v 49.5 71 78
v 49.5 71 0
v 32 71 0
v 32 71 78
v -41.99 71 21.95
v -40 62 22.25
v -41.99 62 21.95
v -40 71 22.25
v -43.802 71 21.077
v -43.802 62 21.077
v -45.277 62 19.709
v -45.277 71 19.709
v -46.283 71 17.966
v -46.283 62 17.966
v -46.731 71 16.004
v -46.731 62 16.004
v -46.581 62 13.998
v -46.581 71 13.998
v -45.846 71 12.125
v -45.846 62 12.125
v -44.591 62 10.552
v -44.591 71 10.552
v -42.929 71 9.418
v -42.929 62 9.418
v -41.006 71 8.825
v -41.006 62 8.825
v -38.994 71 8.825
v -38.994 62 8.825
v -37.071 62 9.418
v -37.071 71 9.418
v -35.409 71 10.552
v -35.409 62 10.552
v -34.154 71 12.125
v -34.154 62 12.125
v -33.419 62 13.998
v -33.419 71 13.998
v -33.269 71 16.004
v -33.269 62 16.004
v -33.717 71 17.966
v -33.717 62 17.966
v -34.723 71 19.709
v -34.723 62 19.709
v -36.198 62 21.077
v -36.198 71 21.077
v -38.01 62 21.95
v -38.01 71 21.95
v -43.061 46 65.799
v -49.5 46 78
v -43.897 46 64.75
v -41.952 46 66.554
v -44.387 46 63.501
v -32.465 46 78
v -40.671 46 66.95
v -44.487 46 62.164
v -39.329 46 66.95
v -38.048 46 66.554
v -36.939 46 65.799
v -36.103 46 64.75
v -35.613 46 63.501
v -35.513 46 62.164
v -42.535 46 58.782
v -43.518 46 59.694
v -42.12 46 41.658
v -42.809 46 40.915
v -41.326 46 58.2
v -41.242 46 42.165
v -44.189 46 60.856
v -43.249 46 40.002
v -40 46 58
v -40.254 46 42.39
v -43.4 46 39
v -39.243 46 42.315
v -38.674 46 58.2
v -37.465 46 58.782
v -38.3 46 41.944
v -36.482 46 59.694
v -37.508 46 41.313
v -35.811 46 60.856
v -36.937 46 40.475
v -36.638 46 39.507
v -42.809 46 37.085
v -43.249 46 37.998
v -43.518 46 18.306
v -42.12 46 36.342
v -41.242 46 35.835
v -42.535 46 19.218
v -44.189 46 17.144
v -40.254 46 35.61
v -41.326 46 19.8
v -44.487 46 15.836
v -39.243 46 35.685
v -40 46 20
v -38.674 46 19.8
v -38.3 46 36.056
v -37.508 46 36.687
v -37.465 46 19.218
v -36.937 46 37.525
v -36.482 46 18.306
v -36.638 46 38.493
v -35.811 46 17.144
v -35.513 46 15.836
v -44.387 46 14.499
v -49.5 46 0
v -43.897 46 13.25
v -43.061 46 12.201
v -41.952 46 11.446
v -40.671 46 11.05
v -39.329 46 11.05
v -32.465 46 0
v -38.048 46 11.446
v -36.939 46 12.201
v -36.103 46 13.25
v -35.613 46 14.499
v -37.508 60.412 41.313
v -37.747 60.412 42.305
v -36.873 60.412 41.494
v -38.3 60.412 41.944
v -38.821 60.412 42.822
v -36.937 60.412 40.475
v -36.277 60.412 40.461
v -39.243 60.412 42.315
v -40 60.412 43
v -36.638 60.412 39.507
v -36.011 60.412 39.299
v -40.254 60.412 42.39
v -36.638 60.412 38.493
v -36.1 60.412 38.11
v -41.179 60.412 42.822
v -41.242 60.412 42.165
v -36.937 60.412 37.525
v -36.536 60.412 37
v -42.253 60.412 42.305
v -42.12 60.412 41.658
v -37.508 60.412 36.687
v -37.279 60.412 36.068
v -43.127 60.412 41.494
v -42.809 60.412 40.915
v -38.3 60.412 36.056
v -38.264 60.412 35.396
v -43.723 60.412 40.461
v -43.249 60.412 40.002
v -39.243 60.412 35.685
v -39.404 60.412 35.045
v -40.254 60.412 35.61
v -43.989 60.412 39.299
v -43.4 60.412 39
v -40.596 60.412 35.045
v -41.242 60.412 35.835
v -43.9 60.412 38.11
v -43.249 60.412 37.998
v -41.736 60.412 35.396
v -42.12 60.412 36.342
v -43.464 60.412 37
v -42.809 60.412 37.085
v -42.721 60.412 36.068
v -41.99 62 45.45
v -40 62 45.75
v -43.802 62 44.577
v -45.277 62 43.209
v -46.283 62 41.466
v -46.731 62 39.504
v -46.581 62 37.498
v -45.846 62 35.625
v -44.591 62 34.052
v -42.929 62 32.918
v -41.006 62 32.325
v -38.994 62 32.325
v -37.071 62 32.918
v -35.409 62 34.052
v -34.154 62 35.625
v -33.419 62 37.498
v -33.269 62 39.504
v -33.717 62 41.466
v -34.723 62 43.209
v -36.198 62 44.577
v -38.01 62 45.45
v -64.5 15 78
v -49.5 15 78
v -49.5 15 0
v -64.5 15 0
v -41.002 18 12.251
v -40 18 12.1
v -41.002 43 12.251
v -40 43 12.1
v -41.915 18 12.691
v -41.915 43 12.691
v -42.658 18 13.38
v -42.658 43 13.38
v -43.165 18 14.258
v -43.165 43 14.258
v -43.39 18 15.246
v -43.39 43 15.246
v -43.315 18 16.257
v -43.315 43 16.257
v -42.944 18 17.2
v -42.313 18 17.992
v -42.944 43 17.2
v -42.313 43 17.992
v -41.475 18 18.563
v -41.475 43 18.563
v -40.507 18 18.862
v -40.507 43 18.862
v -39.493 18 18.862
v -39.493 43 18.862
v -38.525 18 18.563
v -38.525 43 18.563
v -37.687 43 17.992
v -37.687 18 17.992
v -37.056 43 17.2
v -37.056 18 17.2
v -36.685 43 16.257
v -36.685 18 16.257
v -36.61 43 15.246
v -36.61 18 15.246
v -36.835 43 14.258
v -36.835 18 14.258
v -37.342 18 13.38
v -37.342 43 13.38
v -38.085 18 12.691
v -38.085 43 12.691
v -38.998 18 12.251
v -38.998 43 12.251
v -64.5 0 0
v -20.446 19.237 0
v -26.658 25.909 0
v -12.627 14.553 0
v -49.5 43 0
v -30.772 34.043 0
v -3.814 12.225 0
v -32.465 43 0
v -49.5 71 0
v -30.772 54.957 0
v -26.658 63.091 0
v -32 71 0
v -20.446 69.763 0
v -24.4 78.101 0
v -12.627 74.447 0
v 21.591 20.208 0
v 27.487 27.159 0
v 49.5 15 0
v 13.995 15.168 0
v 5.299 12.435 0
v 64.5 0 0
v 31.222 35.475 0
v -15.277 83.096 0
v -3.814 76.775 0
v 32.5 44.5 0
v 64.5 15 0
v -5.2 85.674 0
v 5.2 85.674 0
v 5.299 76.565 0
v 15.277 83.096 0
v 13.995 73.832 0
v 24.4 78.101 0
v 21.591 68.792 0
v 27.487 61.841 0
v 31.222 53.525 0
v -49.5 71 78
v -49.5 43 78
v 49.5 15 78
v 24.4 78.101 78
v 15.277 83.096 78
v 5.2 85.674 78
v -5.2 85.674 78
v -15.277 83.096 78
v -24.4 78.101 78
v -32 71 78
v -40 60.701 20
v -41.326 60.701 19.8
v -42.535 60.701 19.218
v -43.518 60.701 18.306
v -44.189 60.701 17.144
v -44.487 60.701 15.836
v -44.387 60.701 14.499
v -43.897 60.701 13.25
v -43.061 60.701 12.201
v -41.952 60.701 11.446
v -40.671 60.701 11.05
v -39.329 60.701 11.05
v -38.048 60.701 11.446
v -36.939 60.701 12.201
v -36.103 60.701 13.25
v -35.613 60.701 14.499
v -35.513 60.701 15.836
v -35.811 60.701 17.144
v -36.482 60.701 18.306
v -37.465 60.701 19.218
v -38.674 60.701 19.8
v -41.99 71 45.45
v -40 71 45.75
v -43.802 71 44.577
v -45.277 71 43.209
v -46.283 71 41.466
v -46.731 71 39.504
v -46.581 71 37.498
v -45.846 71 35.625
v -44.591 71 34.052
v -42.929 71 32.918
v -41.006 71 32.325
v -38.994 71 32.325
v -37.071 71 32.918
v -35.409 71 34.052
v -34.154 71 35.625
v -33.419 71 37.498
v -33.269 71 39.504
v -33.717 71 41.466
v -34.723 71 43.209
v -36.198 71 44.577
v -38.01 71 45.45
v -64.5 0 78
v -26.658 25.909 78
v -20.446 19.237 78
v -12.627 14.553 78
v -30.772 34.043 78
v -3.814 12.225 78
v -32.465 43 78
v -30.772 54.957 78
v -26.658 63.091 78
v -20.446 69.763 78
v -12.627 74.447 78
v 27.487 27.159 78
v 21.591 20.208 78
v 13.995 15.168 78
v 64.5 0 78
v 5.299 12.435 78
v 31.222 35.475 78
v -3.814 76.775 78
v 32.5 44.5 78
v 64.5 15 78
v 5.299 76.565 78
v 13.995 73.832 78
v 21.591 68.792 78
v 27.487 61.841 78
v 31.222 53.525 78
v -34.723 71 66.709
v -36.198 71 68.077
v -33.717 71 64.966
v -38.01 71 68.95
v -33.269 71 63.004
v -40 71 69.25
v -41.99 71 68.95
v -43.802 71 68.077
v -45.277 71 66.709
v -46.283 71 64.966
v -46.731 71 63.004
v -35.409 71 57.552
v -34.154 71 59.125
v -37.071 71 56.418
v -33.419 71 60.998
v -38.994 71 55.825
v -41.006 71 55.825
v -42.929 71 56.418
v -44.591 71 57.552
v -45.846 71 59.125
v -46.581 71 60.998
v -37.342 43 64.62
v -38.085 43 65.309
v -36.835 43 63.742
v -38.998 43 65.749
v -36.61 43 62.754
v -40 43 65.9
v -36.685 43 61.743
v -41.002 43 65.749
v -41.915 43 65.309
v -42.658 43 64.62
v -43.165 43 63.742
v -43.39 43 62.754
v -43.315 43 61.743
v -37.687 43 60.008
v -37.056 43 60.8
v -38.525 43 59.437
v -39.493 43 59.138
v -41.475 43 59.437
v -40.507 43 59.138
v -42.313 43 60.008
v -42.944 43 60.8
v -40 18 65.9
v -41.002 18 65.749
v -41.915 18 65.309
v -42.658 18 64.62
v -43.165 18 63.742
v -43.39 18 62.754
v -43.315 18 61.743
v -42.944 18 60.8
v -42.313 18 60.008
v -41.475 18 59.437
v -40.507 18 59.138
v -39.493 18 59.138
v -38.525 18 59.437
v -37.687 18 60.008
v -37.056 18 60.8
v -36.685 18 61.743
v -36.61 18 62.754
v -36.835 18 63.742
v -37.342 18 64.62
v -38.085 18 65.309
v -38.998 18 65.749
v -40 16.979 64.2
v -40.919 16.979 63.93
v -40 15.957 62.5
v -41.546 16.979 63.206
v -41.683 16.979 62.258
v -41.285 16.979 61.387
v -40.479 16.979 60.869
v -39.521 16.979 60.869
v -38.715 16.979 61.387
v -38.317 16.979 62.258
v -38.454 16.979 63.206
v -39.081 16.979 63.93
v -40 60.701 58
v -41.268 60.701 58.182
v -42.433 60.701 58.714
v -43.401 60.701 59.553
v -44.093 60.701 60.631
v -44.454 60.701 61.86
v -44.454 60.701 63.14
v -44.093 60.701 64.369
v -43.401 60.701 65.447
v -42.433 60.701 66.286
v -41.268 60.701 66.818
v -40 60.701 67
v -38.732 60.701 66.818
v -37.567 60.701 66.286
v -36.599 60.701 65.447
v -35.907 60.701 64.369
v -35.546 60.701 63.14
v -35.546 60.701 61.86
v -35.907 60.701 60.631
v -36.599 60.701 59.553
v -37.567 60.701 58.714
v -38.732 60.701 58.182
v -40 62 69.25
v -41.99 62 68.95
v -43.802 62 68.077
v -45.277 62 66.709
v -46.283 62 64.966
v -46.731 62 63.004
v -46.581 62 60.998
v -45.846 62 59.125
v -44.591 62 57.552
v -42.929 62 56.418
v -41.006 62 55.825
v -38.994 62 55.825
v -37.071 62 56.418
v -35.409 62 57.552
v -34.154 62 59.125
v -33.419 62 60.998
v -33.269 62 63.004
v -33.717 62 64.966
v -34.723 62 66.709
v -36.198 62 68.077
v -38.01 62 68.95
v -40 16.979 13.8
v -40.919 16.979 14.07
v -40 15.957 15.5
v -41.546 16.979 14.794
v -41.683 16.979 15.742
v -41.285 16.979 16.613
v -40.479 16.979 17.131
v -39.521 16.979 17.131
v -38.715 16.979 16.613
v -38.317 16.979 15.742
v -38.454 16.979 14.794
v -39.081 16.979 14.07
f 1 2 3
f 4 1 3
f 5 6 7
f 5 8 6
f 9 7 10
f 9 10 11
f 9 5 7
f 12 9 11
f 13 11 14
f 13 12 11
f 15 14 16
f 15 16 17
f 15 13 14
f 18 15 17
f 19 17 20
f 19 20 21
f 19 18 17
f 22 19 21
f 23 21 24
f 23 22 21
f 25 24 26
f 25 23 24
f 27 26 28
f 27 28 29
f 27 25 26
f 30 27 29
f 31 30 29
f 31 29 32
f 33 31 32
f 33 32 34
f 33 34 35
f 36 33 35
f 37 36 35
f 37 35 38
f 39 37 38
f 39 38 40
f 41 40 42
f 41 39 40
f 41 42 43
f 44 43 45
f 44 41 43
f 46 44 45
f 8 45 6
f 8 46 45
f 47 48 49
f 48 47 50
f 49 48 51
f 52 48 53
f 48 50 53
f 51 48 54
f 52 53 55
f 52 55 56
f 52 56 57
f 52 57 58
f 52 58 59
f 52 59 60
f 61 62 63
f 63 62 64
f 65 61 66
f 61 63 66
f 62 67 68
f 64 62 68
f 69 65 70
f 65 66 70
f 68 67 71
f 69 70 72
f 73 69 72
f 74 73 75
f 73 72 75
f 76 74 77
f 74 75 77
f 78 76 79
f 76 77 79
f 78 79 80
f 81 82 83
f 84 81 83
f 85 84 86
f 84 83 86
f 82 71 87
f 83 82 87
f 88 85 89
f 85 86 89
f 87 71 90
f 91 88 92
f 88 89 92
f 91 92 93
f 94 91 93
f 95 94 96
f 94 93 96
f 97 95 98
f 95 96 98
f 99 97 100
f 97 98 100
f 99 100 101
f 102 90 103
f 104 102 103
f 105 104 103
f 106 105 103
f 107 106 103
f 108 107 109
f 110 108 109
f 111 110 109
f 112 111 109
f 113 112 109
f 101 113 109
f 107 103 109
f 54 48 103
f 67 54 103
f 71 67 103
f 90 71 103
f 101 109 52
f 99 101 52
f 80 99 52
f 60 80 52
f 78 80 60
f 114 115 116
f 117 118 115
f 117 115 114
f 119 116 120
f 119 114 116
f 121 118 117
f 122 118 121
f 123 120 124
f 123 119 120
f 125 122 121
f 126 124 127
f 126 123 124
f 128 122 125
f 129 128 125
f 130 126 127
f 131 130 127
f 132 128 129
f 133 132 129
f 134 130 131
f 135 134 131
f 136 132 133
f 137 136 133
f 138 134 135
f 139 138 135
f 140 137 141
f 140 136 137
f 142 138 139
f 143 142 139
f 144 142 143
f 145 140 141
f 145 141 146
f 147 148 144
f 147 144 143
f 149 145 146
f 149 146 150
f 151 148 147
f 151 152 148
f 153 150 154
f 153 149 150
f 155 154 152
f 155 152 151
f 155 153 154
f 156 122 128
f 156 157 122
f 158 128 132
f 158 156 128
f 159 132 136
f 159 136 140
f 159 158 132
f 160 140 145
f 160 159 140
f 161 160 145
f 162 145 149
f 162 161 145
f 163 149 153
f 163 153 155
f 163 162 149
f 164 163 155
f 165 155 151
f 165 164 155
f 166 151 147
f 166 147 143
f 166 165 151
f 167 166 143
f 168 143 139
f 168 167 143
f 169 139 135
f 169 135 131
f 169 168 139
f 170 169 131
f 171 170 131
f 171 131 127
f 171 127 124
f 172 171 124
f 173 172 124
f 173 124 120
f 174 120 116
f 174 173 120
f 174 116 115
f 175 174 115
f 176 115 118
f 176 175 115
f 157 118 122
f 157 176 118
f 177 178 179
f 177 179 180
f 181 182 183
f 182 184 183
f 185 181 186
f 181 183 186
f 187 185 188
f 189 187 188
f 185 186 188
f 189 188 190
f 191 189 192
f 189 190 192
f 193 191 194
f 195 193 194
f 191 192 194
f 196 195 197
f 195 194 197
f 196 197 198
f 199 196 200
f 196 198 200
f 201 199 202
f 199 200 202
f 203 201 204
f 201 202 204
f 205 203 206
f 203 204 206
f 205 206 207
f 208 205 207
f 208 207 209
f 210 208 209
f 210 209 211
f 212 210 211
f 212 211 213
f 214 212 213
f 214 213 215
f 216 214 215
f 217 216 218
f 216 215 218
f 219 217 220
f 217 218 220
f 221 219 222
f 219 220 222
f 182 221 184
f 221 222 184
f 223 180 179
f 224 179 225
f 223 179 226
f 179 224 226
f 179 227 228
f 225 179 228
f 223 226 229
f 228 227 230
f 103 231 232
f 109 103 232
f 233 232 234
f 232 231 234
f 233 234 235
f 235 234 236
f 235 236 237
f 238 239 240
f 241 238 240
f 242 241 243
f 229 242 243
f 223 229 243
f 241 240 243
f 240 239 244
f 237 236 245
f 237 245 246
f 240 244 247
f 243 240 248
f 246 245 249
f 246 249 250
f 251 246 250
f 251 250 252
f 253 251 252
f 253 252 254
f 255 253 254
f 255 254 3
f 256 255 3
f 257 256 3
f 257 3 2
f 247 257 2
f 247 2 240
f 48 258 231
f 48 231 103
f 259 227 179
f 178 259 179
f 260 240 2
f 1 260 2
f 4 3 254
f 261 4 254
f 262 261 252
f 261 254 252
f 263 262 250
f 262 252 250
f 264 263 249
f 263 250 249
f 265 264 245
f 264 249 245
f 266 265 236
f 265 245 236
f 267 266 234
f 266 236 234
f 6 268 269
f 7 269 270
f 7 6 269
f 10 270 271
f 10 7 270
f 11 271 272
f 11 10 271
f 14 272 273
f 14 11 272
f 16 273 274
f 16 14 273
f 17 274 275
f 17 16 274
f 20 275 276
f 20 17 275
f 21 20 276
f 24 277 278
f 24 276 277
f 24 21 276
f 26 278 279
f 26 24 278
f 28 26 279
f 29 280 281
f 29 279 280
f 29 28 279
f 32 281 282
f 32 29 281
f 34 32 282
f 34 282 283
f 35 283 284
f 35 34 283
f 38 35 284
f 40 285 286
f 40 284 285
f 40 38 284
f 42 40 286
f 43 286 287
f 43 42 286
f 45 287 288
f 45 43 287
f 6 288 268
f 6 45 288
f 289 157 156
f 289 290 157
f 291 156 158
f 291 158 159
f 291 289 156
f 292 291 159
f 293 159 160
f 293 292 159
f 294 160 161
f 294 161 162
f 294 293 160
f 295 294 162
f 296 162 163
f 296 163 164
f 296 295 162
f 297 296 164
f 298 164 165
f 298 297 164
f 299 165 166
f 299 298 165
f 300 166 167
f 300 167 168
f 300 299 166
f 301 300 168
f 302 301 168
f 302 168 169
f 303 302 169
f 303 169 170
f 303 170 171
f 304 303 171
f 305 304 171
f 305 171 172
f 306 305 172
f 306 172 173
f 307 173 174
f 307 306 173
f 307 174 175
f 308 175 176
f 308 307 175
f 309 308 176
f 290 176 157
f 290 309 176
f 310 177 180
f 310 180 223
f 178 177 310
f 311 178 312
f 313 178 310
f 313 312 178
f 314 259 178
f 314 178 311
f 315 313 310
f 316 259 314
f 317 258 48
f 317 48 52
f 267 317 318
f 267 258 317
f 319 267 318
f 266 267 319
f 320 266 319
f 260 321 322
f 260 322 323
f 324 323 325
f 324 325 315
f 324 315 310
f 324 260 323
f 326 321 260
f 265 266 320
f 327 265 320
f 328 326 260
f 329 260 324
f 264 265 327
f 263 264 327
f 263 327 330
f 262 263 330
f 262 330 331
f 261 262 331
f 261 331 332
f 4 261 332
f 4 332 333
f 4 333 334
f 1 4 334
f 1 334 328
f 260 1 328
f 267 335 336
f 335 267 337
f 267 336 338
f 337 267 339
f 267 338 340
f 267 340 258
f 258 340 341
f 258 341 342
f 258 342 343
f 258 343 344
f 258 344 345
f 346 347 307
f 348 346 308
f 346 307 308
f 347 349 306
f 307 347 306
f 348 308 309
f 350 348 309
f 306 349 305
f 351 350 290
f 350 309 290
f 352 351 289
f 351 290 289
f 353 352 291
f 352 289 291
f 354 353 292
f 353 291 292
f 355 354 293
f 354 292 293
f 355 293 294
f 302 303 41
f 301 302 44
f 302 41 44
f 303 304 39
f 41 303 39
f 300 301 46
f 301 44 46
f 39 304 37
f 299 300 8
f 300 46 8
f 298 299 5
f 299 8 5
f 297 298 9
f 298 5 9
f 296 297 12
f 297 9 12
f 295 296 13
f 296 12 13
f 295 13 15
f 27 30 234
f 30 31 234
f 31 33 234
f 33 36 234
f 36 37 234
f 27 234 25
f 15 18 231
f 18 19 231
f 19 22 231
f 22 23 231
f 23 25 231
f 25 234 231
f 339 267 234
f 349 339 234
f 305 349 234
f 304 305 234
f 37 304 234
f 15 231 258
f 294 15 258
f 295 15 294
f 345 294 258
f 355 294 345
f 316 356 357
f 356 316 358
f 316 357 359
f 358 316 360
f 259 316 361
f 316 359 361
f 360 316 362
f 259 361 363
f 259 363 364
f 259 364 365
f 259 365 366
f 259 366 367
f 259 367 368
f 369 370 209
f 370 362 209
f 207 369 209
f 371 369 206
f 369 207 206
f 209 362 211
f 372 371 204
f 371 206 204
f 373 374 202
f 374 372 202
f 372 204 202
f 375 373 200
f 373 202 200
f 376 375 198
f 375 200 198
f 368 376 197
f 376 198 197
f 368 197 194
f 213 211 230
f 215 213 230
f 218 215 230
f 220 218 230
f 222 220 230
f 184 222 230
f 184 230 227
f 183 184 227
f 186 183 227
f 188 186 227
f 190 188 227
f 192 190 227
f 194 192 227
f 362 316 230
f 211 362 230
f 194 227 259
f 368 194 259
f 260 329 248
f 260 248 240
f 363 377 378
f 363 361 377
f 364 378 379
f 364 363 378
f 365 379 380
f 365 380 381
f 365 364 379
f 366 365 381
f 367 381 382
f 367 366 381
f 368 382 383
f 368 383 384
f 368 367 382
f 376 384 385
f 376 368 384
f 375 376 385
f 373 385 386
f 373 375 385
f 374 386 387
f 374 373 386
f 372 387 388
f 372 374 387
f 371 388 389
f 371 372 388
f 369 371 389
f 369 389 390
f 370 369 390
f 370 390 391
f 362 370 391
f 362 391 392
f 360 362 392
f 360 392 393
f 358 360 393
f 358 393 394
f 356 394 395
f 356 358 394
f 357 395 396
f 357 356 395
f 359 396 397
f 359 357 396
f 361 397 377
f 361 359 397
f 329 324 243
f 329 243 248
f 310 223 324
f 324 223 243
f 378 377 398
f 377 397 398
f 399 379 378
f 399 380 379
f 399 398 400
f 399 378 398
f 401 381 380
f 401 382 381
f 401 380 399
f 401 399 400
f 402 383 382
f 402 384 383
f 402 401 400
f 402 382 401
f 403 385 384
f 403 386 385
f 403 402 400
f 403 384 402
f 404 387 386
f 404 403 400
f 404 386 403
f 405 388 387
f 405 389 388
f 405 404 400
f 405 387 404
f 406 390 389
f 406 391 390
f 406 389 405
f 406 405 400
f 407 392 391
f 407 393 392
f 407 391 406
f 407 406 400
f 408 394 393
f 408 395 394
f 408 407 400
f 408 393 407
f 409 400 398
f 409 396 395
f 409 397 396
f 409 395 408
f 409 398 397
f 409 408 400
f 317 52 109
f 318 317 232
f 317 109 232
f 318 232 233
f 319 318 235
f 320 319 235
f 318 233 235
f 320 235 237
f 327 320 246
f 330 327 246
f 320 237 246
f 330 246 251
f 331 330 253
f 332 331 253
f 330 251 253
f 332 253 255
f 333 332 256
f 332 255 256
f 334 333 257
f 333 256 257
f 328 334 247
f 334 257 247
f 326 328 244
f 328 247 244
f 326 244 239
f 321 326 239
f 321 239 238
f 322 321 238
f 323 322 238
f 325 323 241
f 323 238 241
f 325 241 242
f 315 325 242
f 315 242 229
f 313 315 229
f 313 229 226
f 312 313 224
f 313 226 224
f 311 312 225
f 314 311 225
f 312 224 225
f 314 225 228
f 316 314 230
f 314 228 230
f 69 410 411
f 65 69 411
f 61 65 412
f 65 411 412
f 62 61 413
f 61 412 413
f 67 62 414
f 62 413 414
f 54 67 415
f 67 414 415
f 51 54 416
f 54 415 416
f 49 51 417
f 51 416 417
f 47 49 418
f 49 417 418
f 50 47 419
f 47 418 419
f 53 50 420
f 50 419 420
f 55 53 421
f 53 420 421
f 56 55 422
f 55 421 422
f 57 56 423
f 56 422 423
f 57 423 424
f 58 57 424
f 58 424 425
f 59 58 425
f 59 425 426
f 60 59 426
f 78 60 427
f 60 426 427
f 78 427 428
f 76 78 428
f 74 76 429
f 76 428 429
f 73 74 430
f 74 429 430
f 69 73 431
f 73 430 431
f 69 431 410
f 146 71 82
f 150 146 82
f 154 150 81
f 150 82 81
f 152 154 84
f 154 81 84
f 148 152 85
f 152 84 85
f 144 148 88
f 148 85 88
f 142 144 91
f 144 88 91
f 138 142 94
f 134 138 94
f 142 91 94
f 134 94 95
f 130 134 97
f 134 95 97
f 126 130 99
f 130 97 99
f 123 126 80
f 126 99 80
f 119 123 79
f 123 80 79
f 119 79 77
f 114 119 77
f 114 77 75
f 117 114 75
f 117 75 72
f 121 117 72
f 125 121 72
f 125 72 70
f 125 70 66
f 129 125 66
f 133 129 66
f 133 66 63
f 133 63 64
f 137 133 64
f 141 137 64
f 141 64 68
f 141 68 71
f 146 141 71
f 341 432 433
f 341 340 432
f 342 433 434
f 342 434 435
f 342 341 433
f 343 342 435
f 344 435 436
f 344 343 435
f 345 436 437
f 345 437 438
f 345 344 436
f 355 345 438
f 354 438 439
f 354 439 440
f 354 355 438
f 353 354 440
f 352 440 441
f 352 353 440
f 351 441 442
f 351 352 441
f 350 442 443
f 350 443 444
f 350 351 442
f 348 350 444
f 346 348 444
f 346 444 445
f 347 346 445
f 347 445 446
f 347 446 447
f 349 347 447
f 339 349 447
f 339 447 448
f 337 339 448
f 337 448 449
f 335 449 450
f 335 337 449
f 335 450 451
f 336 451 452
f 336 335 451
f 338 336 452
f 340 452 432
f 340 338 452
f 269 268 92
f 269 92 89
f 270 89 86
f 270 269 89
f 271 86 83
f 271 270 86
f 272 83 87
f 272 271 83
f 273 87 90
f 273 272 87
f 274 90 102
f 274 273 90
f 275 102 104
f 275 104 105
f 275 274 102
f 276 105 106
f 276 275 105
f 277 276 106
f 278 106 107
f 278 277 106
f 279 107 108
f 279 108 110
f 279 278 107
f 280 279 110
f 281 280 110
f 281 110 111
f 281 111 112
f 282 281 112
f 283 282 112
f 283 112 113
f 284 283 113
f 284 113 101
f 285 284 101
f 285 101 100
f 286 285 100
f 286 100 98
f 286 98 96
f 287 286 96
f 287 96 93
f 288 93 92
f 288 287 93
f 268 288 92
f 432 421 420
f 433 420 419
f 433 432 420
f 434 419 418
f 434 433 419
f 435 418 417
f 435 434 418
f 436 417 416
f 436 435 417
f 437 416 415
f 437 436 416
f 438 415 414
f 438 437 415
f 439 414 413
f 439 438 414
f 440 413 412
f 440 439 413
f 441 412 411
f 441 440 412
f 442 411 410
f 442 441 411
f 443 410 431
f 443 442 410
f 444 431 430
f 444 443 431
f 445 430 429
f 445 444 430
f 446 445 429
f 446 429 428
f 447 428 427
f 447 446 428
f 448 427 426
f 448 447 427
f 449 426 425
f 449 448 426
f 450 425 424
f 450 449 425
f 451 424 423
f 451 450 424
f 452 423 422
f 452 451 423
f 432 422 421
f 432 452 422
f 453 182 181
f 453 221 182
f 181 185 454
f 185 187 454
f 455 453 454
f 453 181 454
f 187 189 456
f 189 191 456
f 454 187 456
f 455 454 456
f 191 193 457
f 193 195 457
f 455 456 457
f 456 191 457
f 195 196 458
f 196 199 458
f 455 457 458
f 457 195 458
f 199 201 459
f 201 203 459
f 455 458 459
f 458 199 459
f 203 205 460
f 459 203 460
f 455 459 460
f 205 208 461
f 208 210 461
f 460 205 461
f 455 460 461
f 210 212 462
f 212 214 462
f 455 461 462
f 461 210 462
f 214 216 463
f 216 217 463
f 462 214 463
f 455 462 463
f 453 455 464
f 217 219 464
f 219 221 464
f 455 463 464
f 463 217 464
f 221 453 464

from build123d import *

# Parameters (mm, degrees)
EXTRUDE_1_DEPTH        = 78
PATTERN_LINEAR_1_COUNT = 3
PATTERN_LINEAR_1_PITCH = 23.5
SKETCH_26_W            = 4.5
SKETCH_26_H            = 40
M8X1_257_D             = 6.8
M8X1_257_DEPTH         = 14.41228676


with BuildPart() as part:
    # Эскиз1 → Бобышка-Вытянуть1 (new body)
    with BuildSketch(Plane.XY):
        with BuildLine():
            Line((-64.5, 0), (64.5, 0))
            Line((64.5, 0), (64.5, 15))
            Line((64.5, 15), (49.5, 15))
            Line((49.5, 15), (49.5, 71))
            Line((49.5, 71), (32, 71))
            ThreePointArc((32, 71), (0, 86), (-32, 71))
            Line((-32, 71), (-49.5, 71))
            Line((-49.5, 71), (-49.5, 46))
            Line((-49.5, 46), (-32.465366161, 46))
            ThreePointArc((-32.465366161, 46), (32.5, 44.5), (-32.465366161, 43))
            Line((-32.465366161, 43), (-49.5, 43))
            Line((-49.5, 43), (-49.5, 15))
            Line((-49.5, 15), (-64.5, 15))
            Line((-64.5, 15), (-64.5, 0))
        make_face()
    extrude(amount=EXTRUDE_1_DEPTH)

    # Эскиз14 → Вырез-Повернуть2 (revolve, cut)
    with BuildSketch(Plane.ZY.offset(40), mode=Mode.PRIVATE) as cut_revolve_2_sk:
        Polygon((55.75, 62), (55.75, 71), (62.5, 71), (62.5, 60.41228676), (58.5, 60.41228676), align=None)
    cut_revolve_2 = revolve(cut_revolve_2_sk.sketch.rotate(Axis((-40, 71, 62.5), (0, -1, 0)), 180), axis=Axis((-40, 71, 62.5), (0, -1, 0)), mode=Mode.SUBTRACT)

    # Линейный массив1: Вырез-Повернуть2 ×3
    with Locations(*[(0, 0, -i * PATTERN_LINEAR_1_PITCH) for i in range(1, PATTERN_LINEAR_1_COUNT)]):
        add(cut_revolve_2, mode=Mode.SUBTRACT)

    # Эскиз24 → Отверстие обработанное метчиком M8x1.254 (revolve, cut)
    with BuildSketch(Plane(origin=(-40, 43, 62.5), x_dir=(0, 0, 1), z_dir=(1, 0, 0))):
        Polygon((0, 0), (0, 27.042926105), (3.4, 25), (3.4, 0), align=None)
    m8x1_254 = revolve(axis=Axis((-40, 49.35, 62.5), (0, -1, 0)), mode=Mode.SUBTRACT)

    # Эскиз26 → Диаметр отверстия Ø9.0 (9)2 (revolve, cut)
    with BuildSketch(Plane(origin=(-40, 46, 62.5), x_dir=(0, 0, -1), z_dir=(1, 0, 0))):
        with Locations((2.25, 20)):
            Rectangle(SKETCH_26_W, SKETCH_26_H)
    hole_wizard_9_0_9_2 = revolve(axis=Axis((-40, 39.65, 62.5), (0, 1, 0)), mode=Mode.SUBTRACT)

    # Отверстие обработанное метчиком M8x1.257
    with Locations(Plane(origin=(0, 60.41228676, 0), x_dir=(1, 0, 0), z_dir=(0, 1, 0))):
        with Locations((-40, -39)):
            Hole(M8X1_257_D / 2, depth=M8X1_257_DEPTH)

    # Зеркальное отражение1: Отверстие обработанное метчиком M8x1.254, Диаметр отверстия Ø9.0 (9)2 across plane
    add(m8x1_254.mirror(Plane.XY.offset(39)), mode=Mode.SUBTRACT)
    add(hole_wizard_9_0_9_2.mirror(Plane.XY.offset(39)), mode=Mode.SUBTRACT)


solid = part.part
